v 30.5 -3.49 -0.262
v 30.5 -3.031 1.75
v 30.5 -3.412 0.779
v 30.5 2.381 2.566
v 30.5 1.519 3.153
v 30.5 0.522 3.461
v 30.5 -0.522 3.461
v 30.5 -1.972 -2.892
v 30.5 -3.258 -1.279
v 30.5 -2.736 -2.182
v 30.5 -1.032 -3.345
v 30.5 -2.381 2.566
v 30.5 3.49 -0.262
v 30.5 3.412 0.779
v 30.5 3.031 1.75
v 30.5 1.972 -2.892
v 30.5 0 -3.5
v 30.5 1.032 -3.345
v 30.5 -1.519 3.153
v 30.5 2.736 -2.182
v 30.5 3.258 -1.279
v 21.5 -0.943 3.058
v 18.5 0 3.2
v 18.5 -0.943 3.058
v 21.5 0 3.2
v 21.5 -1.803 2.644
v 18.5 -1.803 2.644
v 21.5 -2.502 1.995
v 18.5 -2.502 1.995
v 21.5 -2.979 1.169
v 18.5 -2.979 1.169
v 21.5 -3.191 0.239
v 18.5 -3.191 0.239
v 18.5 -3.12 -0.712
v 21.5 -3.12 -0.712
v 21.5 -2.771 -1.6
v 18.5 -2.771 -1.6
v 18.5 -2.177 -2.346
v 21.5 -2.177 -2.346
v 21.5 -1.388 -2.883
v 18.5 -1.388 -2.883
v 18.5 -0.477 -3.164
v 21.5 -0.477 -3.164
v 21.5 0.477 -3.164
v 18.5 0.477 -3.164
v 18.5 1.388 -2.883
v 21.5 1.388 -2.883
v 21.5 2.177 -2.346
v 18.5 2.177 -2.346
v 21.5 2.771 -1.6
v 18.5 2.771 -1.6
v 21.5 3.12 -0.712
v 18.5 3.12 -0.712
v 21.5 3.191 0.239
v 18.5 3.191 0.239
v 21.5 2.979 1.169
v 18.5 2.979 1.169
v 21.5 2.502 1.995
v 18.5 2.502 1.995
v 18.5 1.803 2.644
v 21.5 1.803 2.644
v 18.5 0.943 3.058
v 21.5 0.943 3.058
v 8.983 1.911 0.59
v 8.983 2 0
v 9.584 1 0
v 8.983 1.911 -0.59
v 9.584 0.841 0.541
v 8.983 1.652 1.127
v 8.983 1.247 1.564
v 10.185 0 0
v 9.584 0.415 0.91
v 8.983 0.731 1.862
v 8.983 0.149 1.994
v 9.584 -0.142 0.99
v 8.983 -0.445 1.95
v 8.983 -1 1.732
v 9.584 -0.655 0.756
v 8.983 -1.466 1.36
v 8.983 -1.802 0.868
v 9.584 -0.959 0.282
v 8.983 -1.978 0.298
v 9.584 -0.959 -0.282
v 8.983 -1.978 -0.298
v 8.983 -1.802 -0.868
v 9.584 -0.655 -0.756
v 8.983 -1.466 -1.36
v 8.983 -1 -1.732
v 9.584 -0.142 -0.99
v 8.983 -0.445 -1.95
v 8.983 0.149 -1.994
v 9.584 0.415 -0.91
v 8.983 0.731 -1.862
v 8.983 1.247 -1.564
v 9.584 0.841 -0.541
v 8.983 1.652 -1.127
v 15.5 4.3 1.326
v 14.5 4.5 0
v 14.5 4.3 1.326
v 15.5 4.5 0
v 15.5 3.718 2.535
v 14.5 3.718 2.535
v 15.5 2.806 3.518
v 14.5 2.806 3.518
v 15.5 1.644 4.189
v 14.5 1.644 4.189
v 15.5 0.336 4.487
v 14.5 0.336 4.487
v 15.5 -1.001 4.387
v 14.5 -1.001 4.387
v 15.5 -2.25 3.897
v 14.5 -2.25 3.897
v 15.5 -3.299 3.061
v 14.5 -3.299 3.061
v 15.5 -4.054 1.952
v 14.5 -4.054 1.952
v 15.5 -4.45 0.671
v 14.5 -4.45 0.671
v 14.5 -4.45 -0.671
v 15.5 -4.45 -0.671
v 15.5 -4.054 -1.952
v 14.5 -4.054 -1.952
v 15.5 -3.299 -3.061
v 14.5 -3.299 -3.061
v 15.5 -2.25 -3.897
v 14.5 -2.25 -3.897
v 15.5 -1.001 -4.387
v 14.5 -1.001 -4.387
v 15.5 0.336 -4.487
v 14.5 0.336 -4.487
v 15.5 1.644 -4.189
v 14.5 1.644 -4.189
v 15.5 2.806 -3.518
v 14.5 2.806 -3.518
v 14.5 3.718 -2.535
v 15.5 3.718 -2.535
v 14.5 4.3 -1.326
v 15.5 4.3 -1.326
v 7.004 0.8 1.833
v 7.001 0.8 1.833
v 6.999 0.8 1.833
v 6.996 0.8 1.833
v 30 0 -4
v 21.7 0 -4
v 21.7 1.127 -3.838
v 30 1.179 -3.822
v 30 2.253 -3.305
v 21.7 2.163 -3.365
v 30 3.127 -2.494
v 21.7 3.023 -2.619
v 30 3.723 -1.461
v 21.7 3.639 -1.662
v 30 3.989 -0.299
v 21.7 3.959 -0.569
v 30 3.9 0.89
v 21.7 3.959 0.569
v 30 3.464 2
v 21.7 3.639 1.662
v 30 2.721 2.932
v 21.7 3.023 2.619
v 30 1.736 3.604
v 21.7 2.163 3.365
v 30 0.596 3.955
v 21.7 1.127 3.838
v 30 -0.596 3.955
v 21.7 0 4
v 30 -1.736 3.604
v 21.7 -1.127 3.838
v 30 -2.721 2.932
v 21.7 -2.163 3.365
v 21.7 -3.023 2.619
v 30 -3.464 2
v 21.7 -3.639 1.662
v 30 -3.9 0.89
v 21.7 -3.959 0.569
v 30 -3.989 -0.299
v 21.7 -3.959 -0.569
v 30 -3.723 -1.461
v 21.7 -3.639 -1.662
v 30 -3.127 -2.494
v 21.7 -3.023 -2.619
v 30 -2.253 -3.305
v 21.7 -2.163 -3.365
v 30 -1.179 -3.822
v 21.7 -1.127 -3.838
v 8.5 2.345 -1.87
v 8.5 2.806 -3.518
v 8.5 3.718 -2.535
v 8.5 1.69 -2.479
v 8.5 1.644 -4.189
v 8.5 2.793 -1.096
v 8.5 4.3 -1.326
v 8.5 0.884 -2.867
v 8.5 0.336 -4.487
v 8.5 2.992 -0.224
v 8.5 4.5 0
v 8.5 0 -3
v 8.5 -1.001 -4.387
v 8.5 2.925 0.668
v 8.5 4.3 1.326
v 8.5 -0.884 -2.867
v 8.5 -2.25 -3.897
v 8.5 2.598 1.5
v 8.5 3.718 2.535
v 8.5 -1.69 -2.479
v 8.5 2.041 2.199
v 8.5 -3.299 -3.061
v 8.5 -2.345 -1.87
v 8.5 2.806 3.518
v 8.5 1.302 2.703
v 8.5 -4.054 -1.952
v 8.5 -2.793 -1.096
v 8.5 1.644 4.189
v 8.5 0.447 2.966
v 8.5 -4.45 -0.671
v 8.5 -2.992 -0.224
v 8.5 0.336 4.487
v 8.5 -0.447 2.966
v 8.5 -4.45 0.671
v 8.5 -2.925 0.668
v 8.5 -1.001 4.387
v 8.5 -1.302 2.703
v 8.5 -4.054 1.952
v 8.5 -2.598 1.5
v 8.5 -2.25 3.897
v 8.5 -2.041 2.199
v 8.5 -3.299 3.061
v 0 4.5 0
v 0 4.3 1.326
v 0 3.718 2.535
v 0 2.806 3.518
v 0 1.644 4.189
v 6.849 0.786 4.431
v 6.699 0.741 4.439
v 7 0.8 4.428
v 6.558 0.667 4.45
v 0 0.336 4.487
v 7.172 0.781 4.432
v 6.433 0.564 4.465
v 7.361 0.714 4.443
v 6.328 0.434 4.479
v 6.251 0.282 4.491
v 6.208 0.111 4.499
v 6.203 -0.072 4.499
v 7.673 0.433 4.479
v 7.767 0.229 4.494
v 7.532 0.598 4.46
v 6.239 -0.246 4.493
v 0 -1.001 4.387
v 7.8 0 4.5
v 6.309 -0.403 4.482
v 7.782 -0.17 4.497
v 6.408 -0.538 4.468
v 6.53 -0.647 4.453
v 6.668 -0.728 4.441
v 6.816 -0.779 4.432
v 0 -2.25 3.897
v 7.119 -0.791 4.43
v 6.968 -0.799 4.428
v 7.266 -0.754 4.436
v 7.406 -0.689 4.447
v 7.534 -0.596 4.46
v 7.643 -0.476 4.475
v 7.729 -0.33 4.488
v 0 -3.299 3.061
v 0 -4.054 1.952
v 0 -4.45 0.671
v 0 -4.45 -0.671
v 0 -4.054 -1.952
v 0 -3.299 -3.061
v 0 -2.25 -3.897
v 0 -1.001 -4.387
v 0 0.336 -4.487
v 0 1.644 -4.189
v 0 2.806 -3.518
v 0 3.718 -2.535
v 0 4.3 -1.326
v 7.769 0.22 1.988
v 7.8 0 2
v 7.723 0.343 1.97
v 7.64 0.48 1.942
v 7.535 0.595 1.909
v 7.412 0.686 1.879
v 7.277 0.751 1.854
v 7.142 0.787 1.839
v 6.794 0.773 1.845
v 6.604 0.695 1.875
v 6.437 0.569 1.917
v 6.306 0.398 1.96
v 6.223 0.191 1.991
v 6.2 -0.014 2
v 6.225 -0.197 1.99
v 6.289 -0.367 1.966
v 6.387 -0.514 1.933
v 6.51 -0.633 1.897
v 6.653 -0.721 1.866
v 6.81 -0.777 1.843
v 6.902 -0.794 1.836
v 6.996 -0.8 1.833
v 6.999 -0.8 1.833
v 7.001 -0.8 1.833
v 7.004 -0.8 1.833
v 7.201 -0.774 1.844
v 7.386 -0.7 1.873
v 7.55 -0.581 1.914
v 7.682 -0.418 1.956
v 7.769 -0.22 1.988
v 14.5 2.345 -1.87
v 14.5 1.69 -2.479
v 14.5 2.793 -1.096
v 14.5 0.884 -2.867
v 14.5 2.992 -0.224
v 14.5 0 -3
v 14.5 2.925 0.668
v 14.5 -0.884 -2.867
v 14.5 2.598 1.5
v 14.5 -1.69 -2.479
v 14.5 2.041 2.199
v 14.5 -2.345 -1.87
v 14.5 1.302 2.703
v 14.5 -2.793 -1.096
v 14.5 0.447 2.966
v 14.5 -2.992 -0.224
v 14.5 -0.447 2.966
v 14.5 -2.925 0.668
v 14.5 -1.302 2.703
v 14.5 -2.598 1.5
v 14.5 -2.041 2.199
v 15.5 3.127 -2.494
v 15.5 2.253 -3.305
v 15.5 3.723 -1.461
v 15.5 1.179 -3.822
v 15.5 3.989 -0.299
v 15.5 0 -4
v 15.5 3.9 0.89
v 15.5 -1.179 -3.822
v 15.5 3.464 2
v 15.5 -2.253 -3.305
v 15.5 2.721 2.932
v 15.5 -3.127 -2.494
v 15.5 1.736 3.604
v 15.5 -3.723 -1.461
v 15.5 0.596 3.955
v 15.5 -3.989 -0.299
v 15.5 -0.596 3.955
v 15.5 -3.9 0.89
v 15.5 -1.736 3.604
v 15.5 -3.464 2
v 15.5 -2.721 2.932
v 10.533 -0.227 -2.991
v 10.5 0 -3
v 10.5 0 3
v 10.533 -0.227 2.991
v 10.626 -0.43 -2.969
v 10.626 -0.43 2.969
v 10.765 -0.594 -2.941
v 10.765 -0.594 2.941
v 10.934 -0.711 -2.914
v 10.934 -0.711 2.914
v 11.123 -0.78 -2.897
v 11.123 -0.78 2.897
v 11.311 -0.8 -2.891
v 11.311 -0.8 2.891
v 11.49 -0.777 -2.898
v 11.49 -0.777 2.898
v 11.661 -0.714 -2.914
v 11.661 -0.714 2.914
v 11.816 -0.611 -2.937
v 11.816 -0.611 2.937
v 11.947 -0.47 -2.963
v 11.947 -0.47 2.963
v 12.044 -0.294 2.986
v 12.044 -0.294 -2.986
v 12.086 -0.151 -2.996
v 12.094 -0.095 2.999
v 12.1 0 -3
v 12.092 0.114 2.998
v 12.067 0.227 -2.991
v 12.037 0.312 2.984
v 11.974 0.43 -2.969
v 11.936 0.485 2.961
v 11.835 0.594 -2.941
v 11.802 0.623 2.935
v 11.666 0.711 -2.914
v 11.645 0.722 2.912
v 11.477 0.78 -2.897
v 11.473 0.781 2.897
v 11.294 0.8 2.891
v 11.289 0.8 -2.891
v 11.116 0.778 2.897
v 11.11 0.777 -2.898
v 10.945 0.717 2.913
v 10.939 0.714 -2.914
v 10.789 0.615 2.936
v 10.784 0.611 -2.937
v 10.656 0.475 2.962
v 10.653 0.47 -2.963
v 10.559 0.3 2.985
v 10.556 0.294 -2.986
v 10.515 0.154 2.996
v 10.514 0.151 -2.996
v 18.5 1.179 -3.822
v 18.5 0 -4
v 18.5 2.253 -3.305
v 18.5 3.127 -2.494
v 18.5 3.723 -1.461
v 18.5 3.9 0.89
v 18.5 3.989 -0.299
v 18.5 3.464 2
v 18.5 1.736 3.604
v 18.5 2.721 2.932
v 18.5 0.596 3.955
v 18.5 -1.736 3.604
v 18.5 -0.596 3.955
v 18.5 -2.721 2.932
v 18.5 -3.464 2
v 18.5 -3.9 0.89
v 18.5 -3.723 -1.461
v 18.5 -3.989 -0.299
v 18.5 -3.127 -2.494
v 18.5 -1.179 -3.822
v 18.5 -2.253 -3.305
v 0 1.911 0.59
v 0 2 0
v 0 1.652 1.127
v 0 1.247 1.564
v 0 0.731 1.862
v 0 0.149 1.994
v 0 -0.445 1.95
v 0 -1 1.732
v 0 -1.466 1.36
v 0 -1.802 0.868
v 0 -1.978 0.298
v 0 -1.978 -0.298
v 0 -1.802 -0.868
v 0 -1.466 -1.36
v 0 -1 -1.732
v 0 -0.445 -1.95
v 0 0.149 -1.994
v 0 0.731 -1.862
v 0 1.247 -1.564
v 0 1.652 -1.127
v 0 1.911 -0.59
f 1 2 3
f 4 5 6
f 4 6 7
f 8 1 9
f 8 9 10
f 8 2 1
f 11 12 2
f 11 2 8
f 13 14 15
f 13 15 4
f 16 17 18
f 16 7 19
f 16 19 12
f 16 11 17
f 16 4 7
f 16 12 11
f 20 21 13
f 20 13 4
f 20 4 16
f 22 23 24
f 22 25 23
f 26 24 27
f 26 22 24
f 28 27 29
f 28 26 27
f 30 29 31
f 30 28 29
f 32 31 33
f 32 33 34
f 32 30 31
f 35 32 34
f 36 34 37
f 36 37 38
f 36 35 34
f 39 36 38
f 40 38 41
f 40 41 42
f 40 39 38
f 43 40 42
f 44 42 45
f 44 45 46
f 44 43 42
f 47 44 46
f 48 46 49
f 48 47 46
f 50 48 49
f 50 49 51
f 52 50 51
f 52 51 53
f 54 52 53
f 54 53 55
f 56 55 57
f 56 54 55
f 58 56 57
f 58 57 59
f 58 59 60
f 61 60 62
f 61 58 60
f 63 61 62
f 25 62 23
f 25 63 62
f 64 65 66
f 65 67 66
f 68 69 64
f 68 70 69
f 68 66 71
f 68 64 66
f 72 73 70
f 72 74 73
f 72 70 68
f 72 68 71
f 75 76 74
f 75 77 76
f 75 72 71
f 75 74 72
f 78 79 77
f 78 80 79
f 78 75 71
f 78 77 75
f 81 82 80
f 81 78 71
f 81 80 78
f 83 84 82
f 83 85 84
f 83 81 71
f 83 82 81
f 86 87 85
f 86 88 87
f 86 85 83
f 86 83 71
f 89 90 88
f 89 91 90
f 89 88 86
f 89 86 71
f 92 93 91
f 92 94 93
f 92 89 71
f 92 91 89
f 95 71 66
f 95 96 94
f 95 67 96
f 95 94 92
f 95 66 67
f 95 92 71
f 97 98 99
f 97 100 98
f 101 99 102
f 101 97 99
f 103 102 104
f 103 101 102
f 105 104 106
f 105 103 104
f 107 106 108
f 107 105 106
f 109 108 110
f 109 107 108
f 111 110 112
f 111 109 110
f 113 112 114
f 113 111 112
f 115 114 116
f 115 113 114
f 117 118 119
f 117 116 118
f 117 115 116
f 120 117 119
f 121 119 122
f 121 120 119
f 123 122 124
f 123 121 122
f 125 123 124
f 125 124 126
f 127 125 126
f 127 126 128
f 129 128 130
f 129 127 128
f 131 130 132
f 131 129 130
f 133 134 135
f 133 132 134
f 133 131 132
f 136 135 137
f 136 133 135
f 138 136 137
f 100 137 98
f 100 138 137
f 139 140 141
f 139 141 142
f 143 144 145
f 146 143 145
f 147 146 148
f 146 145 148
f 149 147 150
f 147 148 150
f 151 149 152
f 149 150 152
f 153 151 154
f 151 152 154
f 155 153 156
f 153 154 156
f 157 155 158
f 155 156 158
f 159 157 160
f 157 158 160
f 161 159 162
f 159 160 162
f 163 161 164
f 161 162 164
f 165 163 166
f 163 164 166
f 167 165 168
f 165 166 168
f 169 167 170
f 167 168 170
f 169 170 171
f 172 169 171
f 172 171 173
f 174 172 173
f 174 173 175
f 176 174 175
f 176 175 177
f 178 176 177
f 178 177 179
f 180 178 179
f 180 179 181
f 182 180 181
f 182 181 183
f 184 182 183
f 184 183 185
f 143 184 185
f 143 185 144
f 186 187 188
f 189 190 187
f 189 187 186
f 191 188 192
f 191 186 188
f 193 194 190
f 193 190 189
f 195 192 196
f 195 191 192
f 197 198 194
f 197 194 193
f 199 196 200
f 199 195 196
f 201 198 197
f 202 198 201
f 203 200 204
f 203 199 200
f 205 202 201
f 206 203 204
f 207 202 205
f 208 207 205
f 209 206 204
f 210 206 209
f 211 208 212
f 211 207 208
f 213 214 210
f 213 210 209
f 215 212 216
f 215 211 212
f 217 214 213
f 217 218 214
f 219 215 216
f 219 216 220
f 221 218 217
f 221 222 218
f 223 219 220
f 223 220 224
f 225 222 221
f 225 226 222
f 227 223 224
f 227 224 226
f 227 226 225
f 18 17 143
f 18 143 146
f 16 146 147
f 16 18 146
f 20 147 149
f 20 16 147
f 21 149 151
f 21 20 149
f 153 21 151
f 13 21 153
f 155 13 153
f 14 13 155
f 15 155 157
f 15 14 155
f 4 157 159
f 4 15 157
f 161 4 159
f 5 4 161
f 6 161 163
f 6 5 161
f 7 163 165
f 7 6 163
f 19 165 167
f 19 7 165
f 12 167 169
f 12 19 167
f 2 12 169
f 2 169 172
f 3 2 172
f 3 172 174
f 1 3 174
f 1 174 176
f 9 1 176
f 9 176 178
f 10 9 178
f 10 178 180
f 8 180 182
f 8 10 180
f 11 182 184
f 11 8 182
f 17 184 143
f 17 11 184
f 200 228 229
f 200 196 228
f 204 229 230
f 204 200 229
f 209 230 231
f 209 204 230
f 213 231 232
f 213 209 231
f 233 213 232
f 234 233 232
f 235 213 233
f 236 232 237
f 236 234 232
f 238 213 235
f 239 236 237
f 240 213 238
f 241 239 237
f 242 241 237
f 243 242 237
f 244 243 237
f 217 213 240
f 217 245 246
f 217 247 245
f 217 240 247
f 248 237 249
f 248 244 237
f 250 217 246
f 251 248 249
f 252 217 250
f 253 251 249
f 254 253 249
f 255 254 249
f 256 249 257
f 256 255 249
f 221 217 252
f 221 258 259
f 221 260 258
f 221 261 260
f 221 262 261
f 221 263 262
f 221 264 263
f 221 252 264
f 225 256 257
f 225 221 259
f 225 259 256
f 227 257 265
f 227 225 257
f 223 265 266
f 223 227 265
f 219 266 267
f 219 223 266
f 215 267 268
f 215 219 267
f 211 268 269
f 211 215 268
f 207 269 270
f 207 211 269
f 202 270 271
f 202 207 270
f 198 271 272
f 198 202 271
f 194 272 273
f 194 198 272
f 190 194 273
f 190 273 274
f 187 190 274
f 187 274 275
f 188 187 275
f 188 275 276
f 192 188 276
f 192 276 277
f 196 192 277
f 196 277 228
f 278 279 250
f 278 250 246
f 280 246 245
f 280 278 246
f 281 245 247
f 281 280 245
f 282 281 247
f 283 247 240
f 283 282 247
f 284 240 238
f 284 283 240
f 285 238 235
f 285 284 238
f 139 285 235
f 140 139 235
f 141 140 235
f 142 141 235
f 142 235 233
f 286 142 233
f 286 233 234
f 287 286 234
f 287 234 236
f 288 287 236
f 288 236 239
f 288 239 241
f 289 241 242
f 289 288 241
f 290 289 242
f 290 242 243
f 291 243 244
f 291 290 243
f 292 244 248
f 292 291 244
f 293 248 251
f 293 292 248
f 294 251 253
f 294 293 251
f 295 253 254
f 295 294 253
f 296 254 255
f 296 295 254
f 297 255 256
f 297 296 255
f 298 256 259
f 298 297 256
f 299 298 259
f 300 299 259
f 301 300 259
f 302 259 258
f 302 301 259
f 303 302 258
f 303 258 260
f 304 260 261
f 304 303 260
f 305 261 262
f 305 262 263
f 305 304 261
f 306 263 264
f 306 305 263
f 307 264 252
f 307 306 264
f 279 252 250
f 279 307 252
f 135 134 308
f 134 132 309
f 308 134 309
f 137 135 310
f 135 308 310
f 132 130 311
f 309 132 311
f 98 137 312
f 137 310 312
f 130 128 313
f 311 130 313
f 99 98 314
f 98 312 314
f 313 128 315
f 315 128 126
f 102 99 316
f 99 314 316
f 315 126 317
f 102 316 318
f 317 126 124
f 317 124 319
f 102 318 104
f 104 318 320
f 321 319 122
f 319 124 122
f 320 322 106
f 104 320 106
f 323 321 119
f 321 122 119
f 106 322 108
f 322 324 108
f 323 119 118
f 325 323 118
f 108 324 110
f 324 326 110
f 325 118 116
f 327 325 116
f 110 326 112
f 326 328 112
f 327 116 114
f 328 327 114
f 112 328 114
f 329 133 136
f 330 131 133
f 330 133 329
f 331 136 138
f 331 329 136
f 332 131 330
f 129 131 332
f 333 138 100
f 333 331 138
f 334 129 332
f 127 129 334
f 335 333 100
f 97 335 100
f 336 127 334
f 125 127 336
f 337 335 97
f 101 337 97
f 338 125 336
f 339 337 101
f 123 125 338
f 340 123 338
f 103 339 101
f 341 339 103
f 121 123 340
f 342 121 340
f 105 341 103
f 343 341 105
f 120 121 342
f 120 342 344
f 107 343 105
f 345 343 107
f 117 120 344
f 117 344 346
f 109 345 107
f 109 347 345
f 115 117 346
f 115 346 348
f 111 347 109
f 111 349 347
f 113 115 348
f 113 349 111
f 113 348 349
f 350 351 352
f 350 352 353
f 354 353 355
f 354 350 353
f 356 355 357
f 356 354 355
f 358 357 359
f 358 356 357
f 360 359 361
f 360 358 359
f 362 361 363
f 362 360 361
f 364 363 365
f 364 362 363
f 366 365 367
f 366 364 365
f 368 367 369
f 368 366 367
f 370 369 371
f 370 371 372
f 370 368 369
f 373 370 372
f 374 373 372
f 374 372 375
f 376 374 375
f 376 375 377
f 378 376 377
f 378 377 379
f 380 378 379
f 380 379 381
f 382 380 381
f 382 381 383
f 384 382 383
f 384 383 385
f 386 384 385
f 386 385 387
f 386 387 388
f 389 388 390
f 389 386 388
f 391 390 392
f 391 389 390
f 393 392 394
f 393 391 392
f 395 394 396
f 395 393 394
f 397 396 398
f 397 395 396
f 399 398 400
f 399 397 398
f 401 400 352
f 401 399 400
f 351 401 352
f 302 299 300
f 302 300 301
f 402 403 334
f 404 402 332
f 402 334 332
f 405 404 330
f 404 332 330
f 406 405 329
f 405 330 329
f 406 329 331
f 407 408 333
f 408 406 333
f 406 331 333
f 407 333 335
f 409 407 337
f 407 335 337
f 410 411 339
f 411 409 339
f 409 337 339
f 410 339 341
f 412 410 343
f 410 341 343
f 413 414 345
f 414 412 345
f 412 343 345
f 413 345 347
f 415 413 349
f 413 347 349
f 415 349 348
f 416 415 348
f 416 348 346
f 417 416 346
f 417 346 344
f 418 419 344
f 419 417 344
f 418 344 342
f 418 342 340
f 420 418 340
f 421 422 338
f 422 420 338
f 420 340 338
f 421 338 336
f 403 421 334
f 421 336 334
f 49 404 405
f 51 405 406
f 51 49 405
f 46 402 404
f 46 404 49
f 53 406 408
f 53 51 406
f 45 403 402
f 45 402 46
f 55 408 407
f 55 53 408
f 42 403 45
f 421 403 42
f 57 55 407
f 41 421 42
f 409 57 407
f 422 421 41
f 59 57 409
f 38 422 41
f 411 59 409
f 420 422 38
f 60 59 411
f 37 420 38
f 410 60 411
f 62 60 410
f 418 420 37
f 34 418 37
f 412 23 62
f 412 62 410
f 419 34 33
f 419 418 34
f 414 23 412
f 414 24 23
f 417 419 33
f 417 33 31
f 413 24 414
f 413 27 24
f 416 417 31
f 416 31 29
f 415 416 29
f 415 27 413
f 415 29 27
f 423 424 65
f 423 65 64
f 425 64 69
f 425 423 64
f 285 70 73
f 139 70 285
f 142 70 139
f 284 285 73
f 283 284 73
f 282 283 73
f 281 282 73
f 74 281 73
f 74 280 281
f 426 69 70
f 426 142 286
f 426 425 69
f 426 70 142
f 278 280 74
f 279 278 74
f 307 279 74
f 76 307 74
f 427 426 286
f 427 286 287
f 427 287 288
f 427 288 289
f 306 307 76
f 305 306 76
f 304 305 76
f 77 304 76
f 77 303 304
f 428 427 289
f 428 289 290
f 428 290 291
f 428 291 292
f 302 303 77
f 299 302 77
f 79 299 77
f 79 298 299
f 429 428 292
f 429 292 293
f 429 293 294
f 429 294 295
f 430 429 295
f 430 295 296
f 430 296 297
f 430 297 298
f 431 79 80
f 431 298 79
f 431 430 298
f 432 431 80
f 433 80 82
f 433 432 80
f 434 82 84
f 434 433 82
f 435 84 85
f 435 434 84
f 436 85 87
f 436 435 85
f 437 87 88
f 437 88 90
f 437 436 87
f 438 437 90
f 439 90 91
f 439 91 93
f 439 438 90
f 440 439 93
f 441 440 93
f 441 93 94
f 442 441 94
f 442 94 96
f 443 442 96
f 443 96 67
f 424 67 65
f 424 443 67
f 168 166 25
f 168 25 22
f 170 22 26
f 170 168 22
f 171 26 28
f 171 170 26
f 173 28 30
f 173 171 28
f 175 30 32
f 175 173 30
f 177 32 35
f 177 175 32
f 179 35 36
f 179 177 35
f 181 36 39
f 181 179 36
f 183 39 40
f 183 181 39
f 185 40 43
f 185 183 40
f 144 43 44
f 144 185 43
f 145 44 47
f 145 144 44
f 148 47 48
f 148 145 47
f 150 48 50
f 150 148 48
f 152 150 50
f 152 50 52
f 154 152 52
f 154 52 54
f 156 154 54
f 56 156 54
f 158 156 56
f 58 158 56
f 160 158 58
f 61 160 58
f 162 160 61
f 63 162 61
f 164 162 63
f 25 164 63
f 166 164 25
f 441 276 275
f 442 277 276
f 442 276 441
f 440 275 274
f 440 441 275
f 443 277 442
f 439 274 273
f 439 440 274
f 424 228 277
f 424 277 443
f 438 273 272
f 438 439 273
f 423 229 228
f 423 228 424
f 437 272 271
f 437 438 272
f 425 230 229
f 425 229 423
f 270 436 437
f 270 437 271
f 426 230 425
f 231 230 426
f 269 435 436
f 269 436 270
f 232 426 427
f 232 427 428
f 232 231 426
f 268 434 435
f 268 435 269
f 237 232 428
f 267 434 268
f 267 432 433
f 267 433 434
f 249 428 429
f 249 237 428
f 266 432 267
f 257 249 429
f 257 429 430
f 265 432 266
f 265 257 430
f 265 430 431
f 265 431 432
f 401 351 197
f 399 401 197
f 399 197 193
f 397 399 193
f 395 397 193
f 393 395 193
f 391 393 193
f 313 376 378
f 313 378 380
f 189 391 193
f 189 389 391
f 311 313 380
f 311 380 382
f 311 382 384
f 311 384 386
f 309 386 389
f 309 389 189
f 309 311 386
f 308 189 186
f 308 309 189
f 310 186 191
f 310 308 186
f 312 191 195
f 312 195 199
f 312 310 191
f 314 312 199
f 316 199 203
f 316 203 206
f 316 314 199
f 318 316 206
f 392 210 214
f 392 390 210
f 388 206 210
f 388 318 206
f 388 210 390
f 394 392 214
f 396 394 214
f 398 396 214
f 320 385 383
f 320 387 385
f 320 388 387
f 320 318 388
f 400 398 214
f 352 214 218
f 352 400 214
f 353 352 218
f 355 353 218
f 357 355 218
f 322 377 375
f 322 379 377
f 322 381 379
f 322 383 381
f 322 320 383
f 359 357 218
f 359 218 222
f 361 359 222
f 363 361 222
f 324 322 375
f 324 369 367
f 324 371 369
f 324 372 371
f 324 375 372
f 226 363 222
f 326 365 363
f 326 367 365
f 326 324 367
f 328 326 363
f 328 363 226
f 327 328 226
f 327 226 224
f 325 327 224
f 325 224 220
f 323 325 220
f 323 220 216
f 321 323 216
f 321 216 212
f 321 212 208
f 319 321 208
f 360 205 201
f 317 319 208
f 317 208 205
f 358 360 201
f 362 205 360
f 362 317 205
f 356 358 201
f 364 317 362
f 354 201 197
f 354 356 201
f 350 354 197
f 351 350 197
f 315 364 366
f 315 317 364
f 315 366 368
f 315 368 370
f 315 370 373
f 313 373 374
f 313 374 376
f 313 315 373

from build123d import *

# Parameters (mm, degrees)
FL_CHE_START                         = -6
FL_CHE_VERSCHIEBEN1_2_OUTLINE_R      = 1.25
FL_CHE_VERSCHIEBEN1_2_DEPTH          = 12
FL_CHE_START_2                       = 1.833034949
FL_CHE_VERSCHIEBEN1_3_OUTLINE_R      = 0.8
FL_CHE_VERSCHIEBEN1_3_DEPTH          = 4.166965051
SCHNITT_LINEAR_AUSTRAGEN1_DEPTH      = 20
SCHNITT_LINEAR_AUSTRAGEN1_DEPTH_BACK = 4.5
SKIZZE1_R                            = 4.5
SKIZZE2_R                            = 4
AUFSATZ_LINEAR_AUSTRAGEN1_DEPTH      = 15
SCHNITT_LINEAR_START                 = -1
SKIZZE3_R                            = 4.5
SKIZZE3_R_2                          = 3
SCHNITT_LINEAR_AUSTRAGEN2_DEPTH      = 6
FASE1_SIZE                           = 0.5
SCHNITT_LINEAR_AUSTRAGEN3_DEPTH      = 10
SCHNITT_LINEAR_AUSTRAGEN3_DEPTH_BACK = 10
SKIZZE5_R                            = 0.8


with BuildPart() as part:
    # Fläche verschieben1: read off the stored shape, not the designer's step
    # Fläche verschieben1 outline → Fläche verschieben1 (revolve)
    with BuildSketch(Plane.YX):
        with BuildLine():
            ThreePointArc((1.75, 26.8), (1.808578644, 26.941421356), (1.95, 27))
            Line((1.95, 27), (2, 27))
            Line((2, 27), (2, 33.85))
            Line((2, 33.85), (1.85, 34))
            Line((1.85, 34), (0, 34))
            Line((0, 34), (0, 10.18519763))
            Line((0, 10.18519763), (2, 8.983476392))
            Line((2, 8.983476392), (2, 0))
            Line((2, 0), (4.5, 0))
            Line((4.5, 0), (4.5, 20))
            Line((4.5, 20), (3, 20))
            Line((3, 20), (3, 26))
            Line((3, 26), (1.95, 26))
            ThreePointArc((1.95, 26), (1.808578644, 26.058578644), (1.75, 26.2))
            Line((1.75, 26.2), (1.75, 26.8))
        make_face()
    revolve(axis=Axis((0, 0, 0), (1, 0, 0)))

    # Fl_che verschieben1 2 outline → Fl_che verschieben1 2 (cut)
    with BuildSketch(Plane.XY.offset(FL_CHE_START)):
        with Locations((17, 0)):
            Circle(FL_CHE_VERSCHIEBEN1_2_OUTLINE_R)
    extrude(amount=FL_CHE_VERSCHIEBEN1_2_DEPTH, mode=Mode.SUBTRACT)

    # Fl_che verschieben1 3 outline → Fl_che verschieben1 3 (cut)
    with BuildSketch(Plane.XY.offset(FL_CHE_START_2)):
        with Locations((7, 0)):
            Circle(FL_CHE_VERSCHIEBEN1_3_OUTLINE_R)
    extrude(amount=FL_CHE_VERSCHIEBEN1_3_DEPTH, mode=Mode.SUBTRACT)

    # Skizze1 → Schnitt-Linear austragen1 (cut, two sides: drawn at the far end of the back side and taken through both)
    with BuildSketch(Plane(origin=(20, 0, 0), x_dir=(0, 0, -1), z_dir=(1, 0, 0)).offset(-SCHNITT_LINEAR_AUSTRAGEN1_DEPTH_BACK)):
        with Locations(Location((0, 0, 0), (0, 0, 180))):
            Circle(SKIZZE1_R)
    extrude(amount=SCHNITT_LINEAR_AUSTRAGEN1_DEPTH + SCHNITT_LINEAR_AUSTRAGEN1_DEPTH_BACK, mode=Mode.SUBTRACT)

    # Skizze2 → Aufsatz-Linear austragen1 (add)
    with BuildSketch(Plane(origin=(15.5, 0, 0), x_dir=(0, 0, -1), z_dir=(1, 0, 0))):
        Circle(SKIZZE2_R)
    extrude(amount=AUFSATZ_LINEAR_AUSTRAGEN1_DEPTH)

    # Skizze3 → Schnitt-Linear austragen2 (cut)
    with BuildSketch(Plane(origin=(15.5, 0, 0), x_dir=(0, 0, -1), z_dir=(1, 0, 0)).offset(SCHNITT_LINEAR_START)):
        with Locations(Location((0, 0, 0), (0, 0, 180))):
            Circle(SKIZZE3_R)
        Circle(SKIZZE3_R_2, mode=Mode.SUBTRACT)
    extrude(amount=-SCHNITT_LINEAR_AUSTRAGEN2_DEPTH, mode=Mode.SUBTRACT)

    # Skizze4 → Schnitt-Rotation1 (revolve, cut)
    with BuildSketch(Plane(origin=(0, 0, 0), x_dir=(1, 0, 0), z_dir=(0, 1, 0)), mode=Mode.PRIVATE) as schnitt_rotation1_sk:
        Polygon((18.5, 4), (18.5, 3.2), (21.5, 3.2), (21.7, 4), align=None)
    revolve(schnitt_rotation1_sk.sketch.rotate(Axis((17.168940626, 0, 0), (1, 0, 0)), 180), axis=Axis((17.168940626, 0, 0), (1, 0, 0)), mode=Mode.SUBTRACT)

    # Fase1
    fase1_edges = [part.edges().sort_by_distance(p)[0] for p in [
        (30.5, 0, 4),
    ]]
    chamfer(fase1_edges, length=FASE1_SIZE)

    # Skizze5 → Schnitt-Linear austragen3 (cut, two sides: drawn at the far end of the back side and taken through both)
    with BuildSketch(Plane.XY.offset(-SCHNITT_LINEAR_AUSTRAGEN3_DEPTH_BACK)):
        with Locations(Location((11.3, 0, 0), (0, 0, 180))):
            Circle(SKIZZE5_R)
    extrude(amount=SCHNITT_LINEAR_AUSTRAGEN3_DEPTH + SCHNITT_LINEAR_AUSTRAGEN3_DEPTH_BACK, mode=Mode.SUBTRACT)


solid = part.part
